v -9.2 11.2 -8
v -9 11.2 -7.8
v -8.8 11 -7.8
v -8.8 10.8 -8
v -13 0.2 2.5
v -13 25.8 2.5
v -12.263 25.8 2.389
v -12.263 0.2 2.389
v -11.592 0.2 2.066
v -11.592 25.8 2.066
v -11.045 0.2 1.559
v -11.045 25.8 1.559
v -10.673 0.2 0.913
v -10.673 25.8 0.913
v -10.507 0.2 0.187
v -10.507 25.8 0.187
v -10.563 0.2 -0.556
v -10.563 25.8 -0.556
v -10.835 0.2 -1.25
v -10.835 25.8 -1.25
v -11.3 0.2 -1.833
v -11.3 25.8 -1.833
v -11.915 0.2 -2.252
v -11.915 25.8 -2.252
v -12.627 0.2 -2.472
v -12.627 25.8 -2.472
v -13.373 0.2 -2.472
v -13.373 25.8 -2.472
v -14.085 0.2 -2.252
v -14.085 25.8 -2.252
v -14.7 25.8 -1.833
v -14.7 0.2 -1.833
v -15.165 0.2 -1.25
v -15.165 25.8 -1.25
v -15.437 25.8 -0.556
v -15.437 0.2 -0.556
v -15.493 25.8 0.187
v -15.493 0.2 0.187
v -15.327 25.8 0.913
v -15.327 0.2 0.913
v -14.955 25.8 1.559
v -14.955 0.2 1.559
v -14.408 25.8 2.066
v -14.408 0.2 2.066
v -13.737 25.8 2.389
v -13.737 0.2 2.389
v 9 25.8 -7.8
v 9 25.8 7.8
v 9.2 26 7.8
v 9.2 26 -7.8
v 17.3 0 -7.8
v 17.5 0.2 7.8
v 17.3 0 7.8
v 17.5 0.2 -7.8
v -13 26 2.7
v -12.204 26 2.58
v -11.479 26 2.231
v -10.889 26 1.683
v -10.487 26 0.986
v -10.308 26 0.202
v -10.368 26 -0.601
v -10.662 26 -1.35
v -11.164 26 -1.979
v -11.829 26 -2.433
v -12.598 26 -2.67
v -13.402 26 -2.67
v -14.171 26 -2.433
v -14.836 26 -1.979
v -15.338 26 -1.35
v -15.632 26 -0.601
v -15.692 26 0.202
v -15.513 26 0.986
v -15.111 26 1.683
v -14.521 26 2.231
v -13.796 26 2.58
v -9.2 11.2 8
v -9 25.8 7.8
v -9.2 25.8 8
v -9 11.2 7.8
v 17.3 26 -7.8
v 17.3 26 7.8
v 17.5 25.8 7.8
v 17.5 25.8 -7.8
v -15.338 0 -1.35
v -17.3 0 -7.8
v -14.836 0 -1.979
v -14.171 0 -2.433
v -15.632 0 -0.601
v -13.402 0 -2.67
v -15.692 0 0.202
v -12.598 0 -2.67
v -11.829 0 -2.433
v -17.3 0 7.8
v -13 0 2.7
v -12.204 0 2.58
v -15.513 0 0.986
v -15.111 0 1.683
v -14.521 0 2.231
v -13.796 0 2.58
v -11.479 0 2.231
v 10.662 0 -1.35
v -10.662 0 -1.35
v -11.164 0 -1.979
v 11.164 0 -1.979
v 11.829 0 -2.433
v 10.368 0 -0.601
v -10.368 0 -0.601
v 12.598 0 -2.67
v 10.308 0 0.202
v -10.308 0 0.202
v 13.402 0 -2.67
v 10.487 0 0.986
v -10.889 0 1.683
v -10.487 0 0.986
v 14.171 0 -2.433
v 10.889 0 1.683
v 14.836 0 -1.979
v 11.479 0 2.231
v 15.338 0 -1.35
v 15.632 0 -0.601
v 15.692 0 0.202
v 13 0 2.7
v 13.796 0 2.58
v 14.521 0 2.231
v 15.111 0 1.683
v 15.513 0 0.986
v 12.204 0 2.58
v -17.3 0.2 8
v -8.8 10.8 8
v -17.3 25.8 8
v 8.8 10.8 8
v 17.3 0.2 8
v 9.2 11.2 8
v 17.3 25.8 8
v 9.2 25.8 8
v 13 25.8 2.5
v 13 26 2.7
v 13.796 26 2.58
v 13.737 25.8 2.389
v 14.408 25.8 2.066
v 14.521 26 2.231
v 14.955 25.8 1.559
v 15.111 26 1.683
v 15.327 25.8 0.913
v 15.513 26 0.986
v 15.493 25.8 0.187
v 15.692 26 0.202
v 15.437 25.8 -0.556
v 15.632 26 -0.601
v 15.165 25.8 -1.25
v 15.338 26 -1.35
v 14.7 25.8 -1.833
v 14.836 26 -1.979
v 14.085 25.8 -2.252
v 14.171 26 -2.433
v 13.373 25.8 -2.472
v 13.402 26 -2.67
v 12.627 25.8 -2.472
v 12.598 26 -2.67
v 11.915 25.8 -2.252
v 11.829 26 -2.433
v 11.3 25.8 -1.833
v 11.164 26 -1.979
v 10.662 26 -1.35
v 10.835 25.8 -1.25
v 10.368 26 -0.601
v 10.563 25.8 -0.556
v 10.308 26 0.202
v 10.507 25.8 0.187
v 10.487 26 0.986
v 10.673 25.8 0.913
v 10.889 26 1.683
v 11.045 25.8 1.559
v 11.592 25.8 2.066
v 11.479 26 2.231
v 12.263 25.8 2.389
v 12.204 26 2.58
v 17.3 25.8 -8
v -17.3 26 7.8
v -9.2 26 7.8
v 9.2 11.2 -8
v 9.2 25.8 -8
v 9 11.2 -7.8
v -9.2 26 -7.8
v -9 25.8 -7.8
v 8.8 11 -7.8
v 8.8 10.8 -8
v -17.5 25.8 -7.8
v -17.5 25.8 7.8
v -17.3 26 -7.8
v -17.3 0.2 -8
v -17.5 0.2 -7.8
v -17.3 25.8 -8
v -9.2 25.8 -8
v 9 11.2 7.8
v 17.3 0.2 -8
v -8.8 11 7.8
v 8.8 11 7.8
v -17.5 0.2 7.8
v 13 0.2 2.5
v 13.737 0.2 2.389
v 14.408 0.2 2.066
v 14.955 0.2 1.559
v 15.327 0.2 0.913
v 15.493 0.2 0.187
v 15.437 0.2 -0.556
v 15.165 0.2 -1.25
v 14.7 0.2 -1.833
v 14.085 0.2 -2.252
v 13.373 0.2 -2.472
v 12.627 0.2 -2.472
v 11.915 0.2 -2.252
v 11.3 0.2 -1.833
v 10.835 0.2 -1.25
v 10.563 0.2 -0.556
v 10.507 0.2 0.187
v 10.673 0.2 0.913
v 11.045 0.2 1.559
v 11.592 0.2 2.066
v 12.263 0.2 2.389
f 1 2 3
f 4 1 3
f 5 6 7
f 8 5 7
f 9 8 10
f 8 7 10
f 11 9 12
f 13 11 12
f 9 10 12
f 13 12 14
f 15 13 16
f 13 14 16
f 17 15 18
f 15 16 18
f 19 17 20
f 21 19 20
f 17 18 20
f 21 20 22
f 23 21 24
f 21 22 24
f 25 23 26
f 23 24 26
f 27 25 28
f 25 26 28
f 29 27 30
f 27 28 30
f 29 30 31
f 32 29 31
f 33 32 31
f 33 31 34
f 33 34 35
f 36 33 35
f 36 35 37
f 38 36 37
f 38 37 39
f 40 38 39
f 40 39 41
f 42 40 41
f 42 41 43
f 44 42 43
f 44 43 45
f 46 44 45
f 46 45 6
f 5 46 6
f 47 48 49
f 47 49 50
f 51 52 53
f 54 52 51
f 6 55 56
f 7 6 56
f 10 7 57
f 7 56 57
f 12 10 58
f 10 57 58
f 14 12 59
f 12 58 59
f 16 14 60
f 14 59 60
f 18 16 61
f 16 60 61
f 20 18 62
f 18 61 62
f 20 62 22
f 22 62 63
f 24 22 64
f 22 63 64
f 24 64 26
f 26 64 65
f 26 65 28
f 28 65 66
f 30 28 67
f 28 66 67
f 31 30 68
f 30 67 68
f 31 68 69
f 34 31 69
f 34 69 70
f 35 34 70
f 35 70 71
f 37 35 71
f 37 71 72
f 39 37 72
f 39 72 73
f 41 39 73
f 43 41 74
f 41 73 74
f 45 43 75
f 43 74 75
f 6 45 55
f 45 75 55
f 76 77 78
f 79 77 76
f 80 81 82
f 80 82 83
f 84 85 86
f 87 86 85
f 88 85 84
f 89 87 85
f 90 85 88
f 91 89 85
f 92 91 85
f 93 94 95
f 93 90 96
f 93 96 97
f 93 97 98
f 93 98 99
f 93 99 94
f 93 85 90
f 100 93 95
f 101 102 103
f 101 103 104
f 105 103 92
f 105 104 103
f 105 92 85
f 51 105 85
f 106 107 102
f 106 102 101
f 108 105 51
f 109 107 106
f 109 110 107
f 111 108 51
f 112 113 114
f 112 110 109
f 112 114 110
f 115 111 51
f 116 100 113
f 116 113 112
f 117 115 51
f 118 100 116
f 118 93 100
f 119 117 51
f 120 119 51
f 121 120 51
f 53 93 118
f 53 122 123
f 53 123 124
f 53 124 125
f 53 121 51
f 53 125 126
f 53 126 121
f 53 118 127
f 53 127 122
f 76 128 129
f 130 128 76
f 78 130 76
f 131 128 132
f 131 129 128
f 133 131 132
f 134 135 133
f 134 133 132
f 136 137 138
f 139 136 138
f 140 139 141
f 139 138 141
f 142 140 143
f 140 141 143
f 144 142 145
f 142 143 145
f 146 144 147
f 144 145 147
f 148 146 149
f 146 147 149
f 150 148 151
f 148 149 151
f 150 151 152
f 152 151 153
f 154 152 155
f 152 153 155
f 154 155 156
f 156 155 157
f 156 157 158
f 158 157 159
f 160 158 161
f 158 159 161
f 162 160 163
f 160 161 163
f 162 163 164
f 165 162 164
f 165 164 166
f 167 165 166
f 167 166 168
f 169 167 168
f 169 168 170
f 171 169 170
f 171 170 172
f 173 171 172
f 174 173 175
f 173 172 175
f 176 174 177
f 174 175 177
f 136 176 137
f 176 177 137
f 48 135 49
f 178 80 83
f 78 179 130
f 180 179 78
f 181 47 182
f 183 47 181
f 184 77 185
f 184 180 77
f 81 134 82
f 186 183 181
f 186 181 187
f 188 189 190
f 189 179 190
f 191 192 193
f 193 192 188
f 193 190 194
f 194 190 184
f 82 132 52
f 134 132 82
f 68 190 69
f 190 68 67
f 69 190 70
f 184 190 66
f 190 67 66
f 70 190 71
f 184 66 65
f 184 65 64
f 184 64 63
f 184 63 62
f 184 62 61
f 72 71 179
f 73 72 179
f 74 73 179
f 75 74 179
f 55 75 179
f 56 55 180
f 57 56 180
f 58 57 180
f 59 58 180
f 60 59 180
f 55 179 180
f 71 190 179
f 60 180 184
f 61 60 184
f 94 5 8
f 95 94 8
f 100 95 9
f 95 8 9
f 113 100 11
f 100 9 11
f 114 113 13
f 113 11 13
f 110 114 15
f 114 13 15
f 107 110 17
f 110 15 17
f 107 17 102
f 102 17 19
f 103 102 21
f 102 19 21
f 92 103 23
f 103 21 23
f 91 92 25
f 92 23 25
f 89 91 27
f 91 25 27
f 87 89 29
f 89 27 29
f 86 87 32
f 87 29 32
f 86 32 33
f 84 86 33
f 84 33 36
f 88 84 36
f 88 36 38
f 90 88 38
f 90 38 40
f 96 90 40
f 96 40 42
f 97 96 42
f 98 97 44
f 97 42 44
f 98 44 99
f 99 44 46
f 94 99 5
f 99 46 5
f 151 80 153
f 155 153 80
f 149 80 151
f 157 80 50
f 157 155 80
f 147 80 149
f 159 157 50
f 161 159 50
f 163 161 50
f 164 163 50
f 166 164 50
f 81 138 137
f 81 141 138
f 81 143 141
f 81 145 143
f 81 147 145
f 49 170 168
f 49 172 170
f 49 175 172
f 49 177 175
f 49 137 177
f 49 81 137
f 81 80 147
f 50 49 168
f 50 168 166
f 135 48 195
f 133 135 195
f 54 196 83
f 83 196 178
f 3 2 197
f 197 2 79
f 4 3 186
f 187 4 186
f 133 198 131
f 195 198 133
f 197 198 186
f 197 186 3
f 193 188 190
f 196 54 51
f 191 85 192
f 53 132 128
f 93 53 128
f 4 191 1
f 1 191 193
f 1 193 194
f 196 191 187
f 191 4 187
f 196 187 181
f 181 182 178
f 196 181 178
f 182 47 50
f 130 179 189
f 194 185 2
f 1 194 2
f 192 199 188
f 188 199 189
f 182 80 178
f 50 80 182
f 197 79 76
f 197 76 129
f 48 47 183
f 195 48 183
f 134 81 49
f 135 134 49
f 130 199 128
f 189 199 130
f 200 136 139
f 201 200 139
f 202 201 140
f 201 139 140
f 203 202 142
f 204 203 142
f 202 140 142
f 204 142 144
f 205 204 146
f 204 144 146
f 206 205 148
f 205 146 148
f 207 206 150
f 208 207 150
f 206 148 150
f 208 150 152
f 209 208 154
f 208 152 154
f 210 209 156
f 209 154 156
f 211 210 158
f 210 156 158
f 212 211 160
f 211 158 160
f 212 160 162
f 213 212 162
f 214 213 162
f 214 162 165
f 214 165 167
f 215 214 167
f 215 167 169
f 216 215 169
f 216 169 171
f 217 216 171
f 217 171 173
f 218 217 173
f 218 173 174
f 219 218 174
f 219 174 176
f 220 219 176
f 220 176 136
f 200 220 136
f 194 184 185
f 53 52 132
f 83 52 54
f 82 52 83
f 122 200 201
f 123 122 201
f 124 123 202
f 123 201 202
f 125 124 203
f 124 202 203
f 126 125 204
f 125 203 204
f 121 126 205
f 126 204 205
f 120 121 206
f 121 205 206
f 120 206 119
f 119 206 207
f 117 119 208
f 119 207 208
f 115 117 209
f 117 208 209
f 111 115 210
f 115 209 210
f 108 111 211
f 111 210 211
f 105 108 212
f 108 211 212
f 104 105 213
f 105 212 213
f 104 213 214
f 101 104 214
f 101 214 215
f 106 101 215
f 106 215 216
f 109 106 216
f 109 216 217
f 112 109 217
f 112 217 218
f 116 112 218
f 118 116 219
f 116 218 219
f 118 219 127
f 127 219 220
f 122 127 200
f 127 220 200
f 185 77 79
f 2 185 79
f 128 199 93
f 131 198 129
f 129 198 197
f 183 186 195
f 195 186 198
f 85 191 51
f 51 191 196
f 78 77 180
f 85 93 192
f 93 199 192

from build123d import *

# Parameters (mm, degrees)
BOSS_EXTRUDE1_DEPTH = 8
SKETCH2_R           = 2.5
CUT_EXTRUDE1_DEPTH  = 33.345787979
CHAMFER1_SIZE       = 0.2


with BuildPart() as part:
    # Sketch1 → Boss-Extrude1 (new, symmetric)
    with BuildSketch(Plane.XY):
        Polygon((0, 0), (-17.5, 0), (-17.5, 26), (-9, 26), (-9, 11), (0, 11), align=None)
    boss_extrude1 = extrude(amount=BOSS_EXTRUDE1_DEPTH, both=True)

    # Mirror1: Boss-Extrude1 across plane
    add(boss_extrude1.mirror(Plane(origin=(0, 0, 0), x_dir=(0, 0, 1), z_dir=(1, 0, 0))))

    # Sketch2 → Cut-Extrude1 (cut, through all)
    with BuildSketch(Plane(origin=(0, 26, 0), x_dir=(1, 0, 0), z_dir=(0, 1, 0))):
        with Locations(Location((-13, 0, 0), (0, 0, 270))):
            Circle(SKETCH2_R)
        with Locations(Location((13, 0, 0), (0, 0, 270))):
            Circle(SKETCH2_R)
    extrude(amount=-CUT_EXTRUDE1_DEPTH, mode=Mode.SUBTRACT)

    # Chamfer1
    chamfer1_edges = [part.edges().sort_by_distance(p)[0] for p in [
        (-17.5, 0, 0),
        (-17.5, 26, 0),
        (-9, 26, 0),
        (-9, 11, 0),
        (-9, 18.5, 8),
        (-13.25, 26, 8),
        (17.5, 13, 8),
        (-17.5, 13, 8),
        (17.5, 0, 0),
        (13.25, 26, 8),
        (17.5, 26, 0),
        (9, 18.5, 8),
        (9, 26, 0),
        (9, 11, 0),
        (9, 18.5, -8),
        (13.25, 26, -8),
        (17.5, 13, -8),
        (0, 0, 8),
        (-13, 0, -2.5),
        (-13, 26, -2.5),
        (13, 0, -2.5),
        (13, 26, -2.5),
        (0, 0, -8),
        (-17.5, 13, -8),
        (-13.25, 26, -8),
        (-9, 18.5, -8),
        (0, 11, -8),
        (0, 11, 8),
    ]]
    chamfer(chamfer1_edges, length=CHAMFER1_SIZE)


solid = part.part
